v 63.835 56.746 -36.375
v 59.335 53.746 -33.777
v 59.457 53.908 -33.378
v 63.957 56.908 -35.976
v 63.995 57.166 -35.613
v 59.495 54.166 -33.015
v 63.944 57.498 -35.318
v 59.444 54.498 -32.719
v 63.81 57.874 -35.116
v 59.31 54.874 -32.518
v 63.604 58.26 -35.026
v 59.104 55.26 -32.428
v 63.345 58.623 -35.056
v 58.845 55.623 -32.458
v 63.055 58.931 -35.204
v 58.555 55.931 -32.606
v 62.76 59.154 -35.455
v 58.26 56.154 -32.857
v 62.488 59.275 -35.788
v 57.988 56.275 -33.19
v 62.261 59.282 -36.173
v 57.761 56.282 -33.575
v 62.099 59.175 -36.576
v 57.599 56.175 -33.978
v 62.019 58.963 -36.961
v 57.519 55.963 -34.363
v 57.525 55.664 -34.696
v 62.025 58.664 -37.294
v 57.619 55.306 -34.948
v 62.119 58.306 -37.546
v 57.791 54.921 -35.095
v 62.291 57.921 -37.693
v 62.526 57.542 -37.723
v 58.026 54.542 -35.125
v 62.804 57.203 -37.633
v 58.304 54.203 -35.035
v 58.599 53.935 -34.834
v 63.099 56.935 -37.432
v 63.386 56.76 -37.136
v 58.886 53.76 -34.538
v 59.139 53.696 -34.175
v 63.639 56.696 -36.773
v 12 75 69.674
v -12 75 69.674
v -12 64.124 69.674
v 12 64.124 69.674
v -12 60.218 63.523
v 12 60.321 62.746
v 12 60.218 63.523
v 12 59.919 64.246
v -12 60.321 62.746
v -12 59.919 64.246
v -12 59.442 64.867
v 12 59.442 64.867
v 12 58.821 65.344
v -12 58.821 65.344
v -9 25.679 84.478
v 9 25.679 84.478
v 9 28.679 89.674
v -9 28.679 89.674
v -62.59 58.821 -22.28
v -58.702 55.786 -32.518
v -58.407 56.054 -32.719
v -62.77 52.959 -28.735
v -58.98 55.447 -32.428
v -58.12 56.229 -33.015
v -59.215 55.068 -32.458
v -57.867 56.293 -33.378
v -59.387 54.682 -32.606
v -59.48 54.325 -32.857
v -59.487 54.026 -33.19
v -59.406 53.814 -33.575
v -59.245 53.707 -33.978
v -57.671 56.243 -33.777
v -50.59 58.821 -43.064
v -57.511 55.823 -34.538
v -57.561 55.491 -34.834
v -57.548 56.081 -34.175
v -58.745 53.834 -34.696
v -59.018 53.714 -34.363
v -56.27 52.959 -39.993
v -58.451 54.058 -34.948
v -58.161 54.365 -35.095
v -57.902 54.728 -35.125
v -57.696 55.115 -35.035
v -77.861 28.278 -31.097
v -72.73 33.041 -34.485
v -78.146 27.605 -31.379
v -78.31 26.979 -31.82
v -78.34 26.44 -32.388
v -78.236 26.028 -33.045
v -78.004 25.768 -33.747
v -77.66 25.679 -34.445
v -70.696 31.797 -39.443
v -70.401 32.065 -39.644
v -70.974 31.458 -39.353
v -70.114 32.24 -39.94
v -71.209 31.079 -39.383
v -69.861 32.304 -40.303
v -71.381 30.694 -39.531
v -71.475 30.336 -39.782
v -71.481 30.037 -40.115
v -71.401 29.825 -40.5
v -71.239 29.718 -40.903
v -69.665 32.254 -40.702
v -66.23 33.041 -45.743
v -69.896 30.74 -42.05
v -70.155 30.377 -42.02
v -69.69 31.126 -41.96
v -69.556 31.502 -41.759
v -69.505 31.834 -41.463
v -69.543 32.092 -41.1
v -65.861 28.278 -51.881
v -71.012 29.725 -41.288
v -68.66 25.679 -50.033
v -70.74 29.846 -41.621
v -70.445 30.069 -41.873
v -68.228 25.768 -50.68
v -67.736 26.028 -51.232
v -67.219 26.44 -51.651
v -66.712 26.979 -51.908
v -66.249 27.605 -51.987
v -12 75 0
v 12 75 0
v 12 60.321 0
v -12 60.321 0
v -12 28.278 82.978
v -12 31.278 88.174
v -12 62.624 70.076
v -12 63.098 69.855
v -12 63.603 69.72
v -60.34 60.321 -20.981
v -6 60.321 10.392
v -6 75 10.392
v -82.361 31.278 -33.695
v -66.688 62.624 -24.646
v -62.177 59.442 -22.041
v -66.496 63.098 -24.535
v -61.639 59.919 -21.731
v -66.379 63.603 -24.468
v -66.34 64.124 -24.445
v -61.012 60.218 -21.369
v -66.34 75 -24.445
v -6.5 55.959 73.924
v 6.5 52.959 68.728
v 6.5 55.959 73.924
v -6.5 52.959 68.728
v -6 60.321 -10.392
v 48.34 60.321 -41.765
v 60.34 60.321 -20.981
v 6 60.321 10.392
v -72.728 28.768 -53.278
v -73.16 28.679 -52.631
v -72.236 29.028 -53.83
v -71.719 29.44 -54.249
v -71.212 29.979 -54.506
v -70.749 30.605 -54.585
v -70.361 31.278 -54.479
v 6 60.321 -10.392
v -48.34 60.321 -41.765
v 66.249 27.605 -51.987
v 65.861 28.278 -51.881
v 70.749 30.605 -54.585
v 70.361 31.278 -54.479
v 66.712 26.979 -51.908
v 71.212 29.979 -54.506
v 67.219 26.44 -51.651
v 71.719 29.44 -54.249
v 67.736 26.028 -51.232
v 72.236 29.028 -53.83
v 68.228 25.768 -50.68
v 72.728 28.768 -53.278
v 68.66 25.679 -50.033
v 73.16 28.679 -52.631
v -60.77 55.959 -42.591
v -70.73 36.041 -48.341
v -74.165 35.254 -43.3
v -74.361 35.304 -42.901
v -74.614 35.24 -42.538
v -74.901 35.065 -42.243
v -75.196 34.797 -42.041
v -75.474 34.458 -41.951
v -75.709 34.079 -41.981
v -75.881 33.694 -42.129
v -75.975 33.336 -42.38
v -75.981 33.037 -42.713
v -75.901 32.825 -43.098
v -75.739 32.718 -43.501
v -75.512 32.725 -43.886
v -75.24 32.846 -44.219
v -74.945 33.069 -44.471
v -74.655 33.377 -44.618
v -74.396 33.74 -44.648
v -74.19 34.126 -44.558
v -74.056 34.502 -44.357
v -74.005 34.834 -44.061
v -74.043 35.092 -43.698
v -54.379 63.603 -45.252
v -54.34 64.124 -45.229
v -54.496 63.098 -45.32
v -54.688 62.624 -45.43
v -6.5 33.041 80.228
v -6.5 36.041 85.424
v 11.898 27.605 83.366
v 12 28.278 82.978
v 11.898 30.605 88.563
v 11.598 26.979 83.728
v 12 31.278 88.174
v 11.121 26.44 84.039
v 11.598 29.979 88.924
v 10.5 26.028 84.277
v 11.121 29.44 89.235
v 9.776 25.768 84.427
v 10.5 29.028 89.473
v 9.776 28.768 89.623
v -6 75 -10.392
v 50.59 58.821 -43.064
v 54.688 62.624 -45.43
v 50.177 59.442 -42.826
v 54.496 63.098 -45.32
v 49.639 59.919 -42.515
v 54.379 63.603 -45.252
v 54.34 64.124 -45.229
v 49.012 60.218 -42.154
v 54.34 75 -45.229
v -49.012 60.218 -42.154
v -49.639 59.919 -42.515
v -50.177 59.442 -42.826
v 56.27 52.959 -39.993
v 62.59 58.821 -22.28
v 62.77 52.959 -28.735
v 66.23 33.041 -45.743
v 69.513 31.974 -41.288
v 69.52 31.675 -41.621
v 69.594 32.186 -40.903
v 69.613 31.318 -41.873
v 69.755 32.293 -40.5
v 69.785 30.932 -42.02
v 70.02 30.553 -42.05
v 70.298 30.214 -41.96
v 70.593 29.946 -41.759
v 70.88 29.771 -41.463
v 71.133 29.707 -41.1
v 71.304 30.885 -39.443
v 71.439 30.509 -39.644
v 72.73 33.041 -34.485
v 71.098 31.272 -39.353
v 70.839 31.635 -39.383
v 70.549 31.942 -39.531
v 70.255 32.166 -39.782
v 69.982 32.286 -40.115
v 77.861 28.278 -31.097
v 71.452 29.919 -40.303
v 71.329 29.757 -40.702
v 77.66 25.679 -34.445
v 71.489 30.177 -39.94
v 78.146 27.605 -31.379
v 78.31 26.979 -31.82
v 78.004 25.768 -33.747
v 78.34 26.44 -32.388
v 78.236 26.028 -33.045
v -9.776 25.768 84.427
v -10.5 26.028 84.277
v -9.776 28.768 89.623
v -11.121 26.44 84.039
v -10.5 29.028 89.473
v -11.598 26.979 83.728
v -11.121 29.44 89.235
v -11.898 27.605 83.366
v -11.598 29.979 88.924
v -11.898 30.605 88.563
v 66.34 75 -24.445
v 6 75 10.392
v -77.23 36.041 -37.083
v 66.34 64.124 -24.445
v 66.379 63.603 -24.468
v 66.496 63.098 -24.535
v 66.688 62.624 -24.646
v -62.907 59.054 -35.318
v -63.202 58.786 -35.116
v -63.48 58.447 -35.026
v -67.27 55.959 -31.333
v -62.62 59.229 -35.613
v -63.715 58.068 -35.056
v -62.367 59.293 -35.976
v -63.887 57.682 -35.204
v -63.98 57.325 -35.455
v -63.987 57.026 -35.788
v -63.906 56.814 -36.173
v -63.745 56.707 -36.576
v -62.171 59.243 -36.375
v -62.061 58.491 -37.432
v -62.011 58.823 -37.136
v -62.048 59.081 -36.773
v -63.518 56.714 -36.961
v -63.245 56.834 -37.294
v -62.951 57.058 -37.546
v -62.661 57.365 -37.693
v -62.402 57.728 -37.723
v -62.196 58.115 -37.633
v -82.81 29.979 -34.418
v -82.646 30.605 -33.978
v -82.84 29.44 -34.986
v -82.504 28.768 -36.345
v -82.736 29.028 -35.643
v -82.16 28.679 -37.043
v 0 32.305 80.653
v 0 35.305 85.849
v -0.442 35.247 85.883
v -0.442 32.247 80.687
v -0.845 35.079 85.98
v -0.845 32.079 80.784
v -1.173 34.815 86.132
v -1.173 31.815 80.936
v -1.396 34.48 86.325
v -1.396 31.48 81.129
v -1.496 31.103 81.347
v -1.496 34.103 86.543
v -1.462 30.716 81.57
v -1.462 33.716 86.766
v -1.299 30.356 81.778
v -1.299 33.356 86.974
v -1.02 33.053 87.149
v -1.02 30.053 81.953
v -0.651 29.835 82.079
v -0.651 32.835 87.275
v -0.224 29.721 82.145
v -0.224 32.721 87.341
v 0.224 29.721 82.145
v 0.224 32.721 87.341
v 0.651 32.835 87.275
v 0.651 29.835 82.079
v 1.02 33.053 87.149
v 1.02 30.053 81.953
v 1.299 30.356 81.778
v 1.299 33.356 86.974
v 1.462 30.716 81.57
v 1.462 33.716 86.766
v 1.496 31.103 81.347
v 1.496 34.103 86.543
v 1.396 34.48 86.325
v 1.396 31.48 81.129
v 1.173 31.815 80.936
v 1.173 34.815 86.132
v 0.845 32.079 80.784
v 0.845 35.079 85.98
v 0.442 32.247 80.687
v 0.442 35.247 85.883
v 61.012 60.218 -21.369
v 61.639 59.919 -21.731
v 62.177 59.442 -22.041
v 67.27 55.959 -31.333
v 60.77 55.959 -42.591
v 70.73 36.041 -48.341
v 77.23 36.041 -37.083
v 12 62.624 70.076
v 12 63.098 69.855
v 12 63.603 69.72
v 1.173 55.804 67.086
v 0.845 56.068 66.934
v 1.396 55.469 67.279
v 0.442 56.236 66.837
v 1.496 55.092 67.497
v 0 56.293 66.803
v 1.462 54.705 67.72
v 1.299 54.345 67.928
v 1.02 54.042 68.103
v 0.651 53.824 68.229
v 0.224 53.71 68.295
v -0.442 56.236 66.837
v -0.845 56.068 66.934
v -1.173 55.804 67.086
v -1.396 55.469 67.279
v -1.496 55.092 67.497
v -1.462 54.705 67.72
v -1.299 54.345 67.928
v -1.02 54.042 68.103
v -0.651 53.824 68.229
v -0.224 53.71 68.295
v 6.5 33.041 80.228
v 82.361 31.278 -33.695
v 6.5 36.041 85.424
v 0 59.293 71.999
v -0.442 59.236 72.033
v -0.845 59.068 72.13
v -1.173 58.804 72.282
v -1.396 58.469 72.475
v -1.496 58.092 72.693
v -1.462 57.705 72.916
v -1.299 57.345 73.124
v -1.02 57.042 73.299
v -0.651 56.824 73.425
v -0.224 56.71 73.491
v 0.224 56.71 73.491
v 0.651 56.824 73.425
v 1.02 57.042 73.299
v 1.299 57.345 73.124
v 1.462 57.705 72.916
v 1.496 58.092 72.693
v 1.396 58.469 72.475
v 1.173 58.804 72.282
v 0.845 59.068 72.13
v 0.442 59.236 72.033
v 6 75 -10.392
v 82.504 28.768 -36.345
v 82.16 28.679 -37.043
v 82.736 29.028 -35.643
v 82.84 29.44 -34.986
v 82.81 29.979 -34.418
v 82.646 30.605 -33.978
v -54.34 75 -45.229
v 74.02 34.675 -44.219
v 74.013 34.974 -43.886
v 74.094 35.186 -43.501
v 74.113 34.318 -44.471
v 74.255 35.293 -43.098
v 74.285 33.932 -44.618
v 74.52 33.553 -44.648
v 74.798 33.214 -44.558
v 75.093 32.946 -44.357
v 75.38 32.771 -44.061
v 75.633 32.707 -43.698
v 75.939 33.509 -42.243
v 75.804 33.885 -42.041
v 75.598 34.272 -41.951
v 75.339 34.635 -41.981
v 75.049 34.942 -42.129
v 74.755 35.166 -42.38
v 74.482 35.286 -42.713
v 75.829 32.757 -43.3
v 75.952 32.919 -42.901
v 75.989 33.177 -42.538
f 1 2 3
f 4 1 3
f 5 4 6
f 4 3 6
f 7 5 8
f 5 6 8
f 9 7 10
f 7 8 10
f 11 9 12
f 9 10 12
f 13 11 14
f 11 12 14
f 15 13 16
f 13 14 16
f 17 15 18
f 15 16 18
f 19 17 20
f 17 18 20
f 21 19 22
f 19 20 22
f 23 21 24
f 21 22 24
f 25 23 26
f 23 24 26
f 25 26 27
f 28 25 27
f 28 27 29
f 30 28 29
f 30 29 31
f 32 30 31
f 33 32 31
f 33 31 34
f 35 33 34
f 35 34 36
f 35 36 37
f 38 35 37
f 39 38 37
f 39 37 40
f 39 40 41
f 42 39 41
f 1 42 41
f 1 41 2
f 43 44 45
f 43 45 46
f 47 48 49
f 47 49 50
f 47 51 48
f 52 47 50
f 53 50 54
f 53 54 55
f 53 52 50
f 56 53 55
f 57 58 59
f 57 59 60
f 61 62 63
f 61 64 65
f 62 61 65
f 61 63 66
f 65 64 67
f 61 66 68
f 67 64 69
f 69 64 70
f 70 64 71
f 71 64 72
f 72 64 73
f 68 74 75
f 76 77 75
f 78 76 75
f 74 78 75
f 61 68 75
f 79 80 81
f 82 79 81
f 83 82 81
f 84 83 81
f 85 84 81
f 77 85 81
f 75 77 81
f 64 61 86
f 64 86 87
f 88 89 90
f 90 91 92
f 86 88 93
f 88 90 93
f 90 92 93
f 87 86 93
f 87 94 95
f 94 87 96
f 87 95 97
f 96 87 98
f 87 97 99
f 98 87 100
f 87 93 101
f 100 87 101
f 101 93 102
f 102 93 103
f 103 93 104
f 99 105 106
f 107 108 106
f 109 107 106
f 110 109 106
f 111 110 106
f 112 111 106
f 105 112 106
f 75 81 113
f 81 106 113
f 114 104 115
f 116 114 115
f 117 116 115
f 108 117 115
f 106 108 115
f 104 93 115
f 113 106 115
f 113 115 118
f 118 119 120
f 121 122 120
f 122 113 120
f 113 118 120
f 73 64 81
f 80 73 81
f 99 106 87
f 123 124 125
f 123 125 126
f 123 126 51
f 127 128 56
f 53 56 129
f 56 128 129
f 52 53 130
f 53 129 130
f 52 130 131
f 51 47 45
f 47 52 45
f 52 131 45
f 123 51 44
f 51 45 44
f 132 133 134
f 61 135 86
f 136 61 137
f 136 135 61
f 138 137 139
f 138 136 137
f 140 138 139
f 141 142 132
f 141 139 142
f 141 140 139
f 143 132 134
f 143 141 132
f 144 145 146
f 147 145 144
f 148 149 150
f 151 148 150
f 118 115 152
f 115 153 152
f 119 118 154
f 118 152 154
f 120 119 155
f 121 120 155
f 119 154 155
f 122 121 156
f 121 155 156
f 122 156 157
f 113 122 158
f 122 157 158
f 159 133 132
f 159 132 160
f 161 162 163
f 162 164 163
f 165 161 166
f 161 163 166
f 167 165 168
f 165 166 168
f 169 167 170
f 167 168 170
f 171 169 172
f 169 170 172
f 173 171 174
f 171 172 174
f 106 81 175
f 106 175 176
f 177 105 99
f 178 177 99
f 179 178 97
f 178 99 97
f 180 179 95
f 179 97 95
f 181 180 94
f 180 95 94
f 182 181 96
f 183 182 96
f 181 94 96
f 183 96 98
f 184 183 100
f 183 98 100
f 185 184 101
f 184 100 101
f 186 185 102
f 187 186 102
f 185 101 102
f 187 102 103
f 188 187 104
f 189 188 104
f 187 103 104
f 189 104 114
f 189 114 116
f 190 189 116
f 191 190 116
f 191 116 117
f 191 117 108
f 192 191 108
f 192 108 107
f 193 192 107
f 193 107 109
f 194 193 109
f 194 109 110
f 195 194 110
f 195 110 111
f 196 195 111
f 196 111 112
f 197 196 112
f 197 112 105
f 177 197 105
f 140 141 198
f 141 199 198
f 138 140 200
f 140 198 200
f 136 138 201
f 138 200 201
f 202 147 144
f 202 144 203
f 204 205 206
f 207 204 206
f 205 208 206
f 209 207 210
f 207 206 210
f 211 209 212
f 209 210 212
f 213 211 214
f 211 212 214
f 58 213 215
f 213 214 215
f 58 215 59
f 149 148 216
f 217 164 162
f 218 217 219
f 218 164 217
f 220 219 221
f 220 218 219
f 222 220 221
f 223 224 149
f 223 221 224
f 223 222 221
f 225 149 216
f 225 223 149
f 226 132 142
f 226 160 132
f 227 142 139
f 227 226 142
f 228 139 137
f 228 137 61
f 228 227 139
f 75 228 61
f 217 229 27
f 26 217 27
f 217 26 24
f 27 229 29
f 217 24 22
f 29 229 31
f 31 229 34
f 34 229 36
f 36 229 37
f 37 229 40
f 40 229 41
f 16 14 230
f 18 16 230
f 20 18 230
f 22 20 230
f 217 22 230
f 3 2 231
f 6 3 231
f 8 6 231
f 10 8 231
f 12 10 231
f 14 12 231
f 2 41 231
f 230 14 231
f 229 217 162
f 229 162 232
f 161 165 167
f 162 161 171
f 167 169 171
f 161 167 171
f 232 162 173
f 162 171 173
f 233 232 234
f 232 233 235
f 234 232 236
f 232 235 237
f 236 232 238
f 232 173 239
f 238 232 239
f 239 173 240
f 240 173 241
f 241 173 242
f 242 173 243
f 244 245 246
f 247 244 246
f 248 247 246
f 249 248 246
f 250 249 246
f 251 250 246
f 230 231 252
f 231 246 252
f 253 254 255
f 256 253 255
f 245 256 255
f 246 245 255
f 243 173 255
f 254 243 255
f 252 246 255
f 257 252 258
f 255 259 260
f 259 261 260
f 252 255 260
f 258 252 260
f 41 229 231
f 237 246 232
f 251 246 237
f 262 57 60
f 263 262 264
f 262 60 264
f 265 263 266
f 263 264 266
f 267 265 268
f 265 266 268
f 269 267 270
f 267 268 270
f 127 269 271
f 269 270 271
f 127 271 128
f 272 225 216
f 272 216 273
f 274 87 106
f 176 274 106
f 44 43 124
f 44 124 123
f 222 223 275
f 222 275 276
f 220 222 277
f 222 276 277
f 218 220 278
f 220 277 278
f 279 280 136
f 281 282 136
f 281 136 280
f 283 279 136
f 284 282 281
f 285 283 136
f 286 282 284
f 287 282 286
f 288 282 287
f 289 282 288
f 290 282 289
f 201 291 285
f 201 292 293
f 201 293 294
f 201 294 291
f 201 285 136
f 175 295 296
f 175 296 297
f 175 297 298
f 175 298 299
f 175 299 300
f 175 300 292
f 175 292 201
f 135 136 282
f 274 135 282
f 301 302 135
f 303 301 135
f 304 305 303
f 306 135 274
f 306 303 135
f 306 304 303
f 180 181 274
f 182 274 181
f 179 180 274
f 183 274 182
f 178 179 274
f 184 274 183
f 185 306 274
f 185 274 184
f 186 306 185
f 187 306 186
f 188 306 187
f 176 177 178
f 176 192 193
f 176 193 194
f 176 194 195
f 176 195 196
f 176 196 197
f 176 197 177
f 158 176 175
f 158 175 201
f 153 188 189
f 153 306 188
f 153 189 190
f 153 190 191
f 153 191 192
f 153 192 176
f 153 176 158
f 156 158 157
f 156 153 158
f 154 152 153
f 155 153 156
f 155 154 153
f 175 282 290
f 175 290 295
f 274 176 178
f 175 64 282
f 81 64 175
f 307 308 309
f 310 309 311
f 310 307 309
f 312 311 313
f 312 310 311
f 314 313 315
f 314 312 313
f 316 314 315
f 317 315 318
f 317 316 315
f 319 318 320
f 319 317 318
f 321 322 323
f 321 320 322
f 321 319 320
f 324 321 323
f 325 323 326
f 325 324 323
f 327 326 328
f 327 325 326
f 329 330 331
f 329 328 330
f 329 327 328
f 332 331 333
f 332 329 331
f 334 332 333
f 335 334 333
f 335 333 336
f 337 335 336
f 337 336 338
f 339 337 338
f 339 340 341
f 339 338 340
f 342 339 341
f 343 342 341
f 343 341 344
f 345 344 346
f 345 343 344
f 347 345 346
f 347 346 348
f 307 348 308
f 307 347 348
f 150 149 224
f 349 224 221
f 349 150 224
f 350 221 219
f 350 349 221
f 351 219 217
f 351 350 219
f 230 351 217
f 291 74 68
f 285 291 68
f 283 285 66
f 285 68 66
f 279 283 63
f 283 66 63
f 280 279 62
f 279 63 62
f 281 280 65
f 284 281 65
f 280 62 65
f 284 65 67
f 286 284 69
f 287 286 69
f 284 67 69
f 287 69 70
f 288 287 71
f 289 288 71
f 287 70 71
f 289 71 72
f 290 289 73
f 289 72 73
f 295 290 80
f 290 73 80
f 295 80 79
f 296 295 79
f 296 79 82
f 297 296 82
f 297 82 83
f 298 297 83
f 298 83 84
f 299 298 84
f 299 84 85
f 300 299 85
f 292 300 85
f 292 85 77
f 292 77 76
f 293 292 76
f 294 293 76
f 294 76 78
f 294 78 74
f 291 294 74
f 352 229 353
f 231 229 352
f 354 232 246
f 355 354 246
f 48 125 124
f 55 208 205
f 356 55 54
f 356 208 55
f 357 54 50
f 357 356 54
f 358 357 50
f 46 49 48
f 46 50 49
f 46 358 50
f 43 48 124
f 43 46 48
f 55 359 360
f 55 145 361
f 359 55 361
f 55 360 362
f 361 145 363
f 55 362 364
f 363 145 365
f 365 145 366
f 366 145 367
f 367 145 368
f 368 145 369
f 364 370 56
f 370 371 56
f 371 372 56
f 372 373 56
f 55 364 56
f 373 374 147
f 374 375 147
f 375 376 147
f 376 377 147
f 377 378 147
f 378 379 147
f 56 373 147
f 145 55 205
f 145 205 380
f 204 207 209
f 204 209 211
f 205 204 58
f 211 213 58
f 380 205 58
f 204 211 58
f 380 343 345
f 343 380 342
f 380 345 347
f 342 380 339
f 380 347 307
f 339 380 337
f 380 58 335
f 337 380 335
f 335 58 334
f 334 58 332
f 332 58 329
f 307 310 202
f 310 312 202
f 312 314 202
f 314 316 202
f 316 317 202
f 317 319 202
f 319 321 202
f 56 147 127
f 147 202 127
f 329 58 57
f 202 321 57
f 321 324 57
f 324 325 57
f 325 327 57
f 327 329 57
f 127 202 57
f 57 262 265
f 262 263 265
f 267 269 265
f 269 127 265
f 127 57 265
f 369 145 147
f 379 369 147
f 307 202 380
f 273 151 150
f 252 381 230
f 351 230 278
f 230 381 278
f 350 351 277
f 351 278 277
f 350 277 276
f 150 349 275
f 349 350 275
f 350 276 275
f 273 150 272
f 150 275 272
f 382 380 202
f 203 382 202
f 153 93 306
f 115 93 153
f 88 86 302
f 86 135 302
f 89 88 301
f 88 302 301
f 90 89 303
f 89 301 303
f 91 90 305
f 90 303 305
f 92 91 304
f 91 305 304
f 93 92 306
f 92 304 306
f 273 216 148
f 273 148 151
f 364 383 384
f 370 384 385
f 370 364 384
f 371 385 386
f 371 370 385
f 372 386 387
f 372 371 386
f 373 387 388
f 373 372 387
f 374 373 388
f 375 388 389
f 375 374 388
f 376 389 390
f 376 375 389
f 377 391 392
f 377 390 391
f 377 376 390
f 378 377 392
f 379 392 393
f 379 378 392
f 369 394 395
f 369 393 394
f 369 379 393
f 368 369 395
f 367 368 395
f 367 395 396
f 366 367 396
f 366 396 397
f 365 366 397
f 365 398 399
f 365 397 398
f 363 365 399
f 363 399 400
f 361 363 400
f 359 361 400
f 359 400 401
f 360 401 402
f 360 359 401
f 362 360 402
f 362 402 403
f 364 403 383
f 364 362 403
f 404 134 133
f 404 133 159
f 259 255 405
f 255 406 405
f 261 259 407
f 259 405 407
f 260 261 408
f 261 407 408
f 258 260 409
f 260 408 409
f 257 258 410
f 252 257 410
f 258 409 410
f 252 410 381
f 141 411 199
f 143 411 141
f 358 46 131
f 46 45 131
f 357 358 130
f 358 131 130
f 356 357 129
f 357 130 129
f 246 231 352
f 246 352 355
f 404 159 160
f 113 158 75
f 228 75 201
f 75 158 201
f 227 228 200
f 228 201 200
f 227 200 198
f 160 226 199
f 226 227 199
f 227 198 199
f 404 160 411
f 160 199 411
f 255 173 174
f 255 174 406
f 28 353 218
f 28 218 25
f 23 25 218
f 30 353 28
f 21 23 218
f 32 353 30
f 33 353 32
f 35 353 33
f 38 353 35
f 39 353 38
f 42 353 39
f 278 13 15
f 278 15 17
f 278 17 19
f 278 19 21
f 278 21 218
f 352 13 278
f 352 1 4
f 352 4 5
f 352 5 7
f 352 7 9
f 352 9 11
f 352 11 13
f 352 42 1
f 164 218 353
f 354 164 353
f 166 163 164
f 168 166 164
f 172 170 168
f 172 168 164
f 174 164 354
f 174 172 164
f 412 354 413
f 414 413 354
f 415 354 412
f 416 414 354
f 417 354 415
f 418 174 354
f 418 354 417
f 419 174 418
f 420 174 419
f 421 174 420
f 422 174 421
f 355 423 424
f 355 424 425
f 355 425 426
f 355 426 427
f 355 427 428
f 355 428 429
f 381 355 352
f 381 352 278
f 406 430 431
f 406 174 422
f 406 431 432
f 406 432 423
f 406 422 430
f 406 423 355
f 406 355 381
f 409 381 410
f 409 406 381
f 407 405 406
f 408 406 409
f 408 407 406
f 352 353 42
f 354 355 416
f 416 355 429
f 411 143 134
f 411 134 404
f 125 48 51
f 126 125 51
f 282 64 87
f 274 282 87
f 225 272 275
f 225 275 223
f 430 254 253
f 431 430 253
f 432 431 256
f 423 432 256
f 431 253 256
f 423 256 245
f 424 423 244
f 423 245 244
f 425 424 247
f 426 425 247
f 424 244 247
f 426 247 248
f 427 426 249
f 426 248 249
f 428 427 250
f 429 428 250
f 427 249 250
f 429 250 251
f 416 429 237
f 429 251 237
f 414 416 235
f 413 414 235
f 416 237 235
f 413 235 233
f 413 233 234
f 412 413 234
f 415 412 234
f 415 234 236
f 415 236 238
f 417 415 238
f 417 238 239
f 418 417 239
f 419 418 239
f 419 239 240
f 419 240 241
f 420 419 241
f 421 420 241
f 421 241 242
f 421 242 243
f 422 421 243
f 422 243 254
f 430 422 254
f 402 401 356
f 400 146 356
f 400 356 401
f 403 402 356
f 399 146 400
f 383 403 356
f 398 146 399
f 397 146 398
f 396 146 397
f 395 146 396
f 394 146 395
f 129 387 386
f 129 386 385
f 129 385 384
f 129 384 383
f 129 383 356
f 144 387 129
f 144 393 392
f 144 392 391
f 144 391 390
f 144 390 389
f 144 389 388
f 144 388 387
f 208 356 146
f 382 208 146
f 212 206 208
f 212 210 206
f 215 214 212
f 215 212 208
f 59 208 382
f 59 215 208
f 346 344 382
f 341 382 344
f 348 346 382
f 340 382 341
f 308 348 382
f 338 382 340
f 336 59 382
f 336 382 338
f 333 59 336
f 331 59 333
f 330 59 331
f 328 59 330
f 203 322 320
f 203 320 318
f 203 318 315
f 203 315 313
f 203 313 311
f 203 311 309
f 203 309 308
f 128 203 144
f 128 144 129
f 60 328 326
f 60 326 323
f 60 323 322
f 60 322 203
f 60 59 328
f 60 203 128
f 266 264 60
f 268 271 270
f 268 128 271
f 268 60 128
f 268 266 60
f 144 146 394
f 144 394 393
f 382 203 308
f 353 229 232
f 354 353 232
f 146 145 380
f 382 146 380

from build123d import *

# Parameters (mm, degrees)
SKETCH_4_W                = 24
SKETCH_4_H                = 40
SKETCH_4_W_2              = 13
SKETCH_4_H_2              = 23
EXTRUDE_1_DEPTH           = 6
EXTRUDE_2_REACH           = 105.044
SKETCH_5_W                = 24
SKETCH_5_H                = 5.196152423
SKETCH_6_W                = 24
SKETCH_6_H                = 14.679491924
EXTRUDE_3_DEPTH           = 64.478184725
PATTERN_CIRCULAR_13_COUNT = 3
SKETCH_7_R                = 1.5
CUT_EXTRUDE_1_DEPTH       = 10
SKETCH_8_R                = 1.5
CUT_EXTRUDE_2_DEPTH       = 10
SKETCH_9_R                = 1.5
CUT_EXTRUDE_3_DEPTH       = 10
FILLET_1_R                = 3
FILLET_2_R                = 3
FILLET_3_R                = 3
FILLET_4_R                = 3
FILLET_5_R                = 3
FILLET_6_R                = 3


with BuildPart() as part:
    # 草图4 → 凸台-拉伸1 (new body)
    with BuildSketch(Plane(origin=(0, 43, 74.478184725), x_dir=(-1, 0, 0), z_dir=(0, 0.500000000000001, 0.866025403784438))):
        Rectangle(SKETCH_4_W, SKETCH_4_H)
        Rectangle(SKETCH_4_W_2, SKETCH_4_H_2, mode=Mode.SUBTRACT)
    extrude(amount=EXTRUDE_1_DEPTH)

    # 草图5 → 凸台-拉伸2 (add, up to next)
    with BuildSketch(Plane(origin=(0, 75, 0), x_dir=(1, 0, 0), z_dir=(0, 1, 0)), mode=Mode.PRIVATE) as extrude_2_sk1:
        with Locations((0, -67.076260937)):
            Rectangle(SKETCH_5_W, SKETCH_5_H)
    extrude_2_tool1 = extrude(extrude_2_sk1.sketch, amount=-EXTRUDE_2_REACH, mode=Mode.PRIVATE) - part.part
    add(extrude_2_tool1.solids().sort_by_distance((0, 75, 67.076261))[0])

    # 草图6 → 凸台-拉伸3 (add)
    with BuildSketch(Plane(origin=(0, 0, 64.478184725), x_dir=(-1, 0, 0), z_dir=(0, 0, -1))):
        with Locations((0, 67.660254038)):
            Rectangle(SKETCH_6_W, SKETCH_6_H)
    extrude(amount=EXTRUDE_3_DEPTH)


with BuildPart() as pattern_circular_13_1:
    # 阵列(圆周)13: pattern copy
    add(part.part.rotate(Axis((0, 0, 0), (0, 1, 0)), 1 * 360 / PATTERN_CIRCULAR_13_COUNT))

    # 草图9 → 切除-拉伸3 (cut)
    with BuildSketch(Plane(origin=(64.5, 43, -37.239092363), x_dir=(0.36028834606144033, 0.2401922307076262, 0.9013878188660008), z_dir=(-0.7500000000000038, -0.5000000000000009, 0.4330127018922121))):
        with Locations(Location((3.841298859, 13.306649581, 0), (0, 0, 270))):
            Circle(SKETCH_9_R)
        with Locations(Location((-3.841298859, -13.306649581, 0), (0, 0, 270))):
            Circle(SKETCH_9_R)
    extrude(amount=-CUT_EXTRUDE_3_DEPTH, mode=Mode.SUBTRACT)

    # 圆角1
    fillet_1_edges = [pattern_circular_13_1.edges().sort_by_distance(p)[0] for p in [
        (60.339745962, 63.320508076, -34.837168574),
        (55.839745962, 60.320508076, -32.239092363),
    ]]
    fillet(fillet_1_edges, radius=FILLET_1_R)

    # 圆角4
    fillet_4_edges = [pattern_circular_13_1.edges().sort_by_distance(p)[0] for p in [
        (69.410254038, 27.179491924, -53.930435314),
        (81.410254038, 27.179491924, -33.145825623),
    ]]
    fillet(fillet_4_edges, radius=FILLET_4_R)


with BuildPart() as pattern_circular_13_2:
    # 阵列(圆周)13: pattern copy
    add(part.part.rotate(Axis((0, 0, 0), (0, 1, 0)), 2 * 360 / PATTERN_CIRCULAR_13_COUNT))

    # 草图8 → 切除-拉伸2 (cut)
    with BuildSketch(Plane(origin=(-64.5, 43, -37.239092363), x_dir=(0.3602883460614483, -0.24019223070763335, -0.9013878188659957), z_dir=(0.7499999999999976, -0.500000000000001, 0.4330127018922227))):
        with Locations(Location((-3.841298859, 13.306649581, 0), (0, 0, 90))):
            Circle(SKETCH_8_R)
        with Locations(Location((3.841298859, -13.306649581, 0), (0, 0, 90))):
            Circle(SKETCH_8_R)
    extrude(amount=-CUT_EXTRUDE_2_DEPTH, mode=Mode.SUBTRACT)

    # 圆角3
    fillet_3_edges = [pattern_circular_13_2.edges().sort_by_distance(p)[0] for p in [
        (-60.339745962, 63.320508076, -34.837168574),
        (-55.839745962, 60.320508076, -32.239092363),
    ]]
    fillet(fillet_3_edges, radius=FILLET_3_R)

    # 圆角5
    fillet_5_edges = [pattern_circular_13_2.edges().sort_by_distance(p)[0] for p in [
        (-81.410254038, 27.179491924, -33.145825623),
        (-69.410254038, 27.179491924, -53.930435314),
    ]]
    fillet(fillet_5_edges, radius=FILLET_5_R)


with BuildPart() as part_1:
    add(part.part)

    # 草图7 → 切除-拉伸1 (cut)
    with BuildSketch(Plane(origin=(0, 43, 74.478184725), x_dir=(-1, 0, 0), z_dir=(0, 0.500000000000001, 0.866025403784438))):
        with Locations(Location((0, 13.85, 0), (0, 0, 270))):
            Circle(SKETCH_7_R)
        with Locations(Location((0, -13.85, 0), (0, 0, 270))):
            Circle(SKETCH_7_R)
    extrude(amount=CUT_EXTRUDE_1_DEPTH, mode=Mode.SUBTRACT)

    # 圆角2
    fillet_2_edges = [part_1.edges().sort_by_distance(p)[0] for p in [
        (0, 63.320508076, 69.674337148),
        (0, 60.320508076, 64.478184725),
    ]]
    fillet(fillet_2_edges, radius=FILLET_2_R)

    # 圆角6
    fillet_6_edges = [part_1.edges().sort_by_distance(p)[0] for p in [
        (12, 27.179491924, 87.076260937),
        (-12, 27.179491924, 87.076260937),
    ]]
    fillet(fillet_6_edges, radius=FILLET_6_R)


solid = Compound([pattern_circular_13_1.part, pattern_circular_13_2.part, part_1.part])
